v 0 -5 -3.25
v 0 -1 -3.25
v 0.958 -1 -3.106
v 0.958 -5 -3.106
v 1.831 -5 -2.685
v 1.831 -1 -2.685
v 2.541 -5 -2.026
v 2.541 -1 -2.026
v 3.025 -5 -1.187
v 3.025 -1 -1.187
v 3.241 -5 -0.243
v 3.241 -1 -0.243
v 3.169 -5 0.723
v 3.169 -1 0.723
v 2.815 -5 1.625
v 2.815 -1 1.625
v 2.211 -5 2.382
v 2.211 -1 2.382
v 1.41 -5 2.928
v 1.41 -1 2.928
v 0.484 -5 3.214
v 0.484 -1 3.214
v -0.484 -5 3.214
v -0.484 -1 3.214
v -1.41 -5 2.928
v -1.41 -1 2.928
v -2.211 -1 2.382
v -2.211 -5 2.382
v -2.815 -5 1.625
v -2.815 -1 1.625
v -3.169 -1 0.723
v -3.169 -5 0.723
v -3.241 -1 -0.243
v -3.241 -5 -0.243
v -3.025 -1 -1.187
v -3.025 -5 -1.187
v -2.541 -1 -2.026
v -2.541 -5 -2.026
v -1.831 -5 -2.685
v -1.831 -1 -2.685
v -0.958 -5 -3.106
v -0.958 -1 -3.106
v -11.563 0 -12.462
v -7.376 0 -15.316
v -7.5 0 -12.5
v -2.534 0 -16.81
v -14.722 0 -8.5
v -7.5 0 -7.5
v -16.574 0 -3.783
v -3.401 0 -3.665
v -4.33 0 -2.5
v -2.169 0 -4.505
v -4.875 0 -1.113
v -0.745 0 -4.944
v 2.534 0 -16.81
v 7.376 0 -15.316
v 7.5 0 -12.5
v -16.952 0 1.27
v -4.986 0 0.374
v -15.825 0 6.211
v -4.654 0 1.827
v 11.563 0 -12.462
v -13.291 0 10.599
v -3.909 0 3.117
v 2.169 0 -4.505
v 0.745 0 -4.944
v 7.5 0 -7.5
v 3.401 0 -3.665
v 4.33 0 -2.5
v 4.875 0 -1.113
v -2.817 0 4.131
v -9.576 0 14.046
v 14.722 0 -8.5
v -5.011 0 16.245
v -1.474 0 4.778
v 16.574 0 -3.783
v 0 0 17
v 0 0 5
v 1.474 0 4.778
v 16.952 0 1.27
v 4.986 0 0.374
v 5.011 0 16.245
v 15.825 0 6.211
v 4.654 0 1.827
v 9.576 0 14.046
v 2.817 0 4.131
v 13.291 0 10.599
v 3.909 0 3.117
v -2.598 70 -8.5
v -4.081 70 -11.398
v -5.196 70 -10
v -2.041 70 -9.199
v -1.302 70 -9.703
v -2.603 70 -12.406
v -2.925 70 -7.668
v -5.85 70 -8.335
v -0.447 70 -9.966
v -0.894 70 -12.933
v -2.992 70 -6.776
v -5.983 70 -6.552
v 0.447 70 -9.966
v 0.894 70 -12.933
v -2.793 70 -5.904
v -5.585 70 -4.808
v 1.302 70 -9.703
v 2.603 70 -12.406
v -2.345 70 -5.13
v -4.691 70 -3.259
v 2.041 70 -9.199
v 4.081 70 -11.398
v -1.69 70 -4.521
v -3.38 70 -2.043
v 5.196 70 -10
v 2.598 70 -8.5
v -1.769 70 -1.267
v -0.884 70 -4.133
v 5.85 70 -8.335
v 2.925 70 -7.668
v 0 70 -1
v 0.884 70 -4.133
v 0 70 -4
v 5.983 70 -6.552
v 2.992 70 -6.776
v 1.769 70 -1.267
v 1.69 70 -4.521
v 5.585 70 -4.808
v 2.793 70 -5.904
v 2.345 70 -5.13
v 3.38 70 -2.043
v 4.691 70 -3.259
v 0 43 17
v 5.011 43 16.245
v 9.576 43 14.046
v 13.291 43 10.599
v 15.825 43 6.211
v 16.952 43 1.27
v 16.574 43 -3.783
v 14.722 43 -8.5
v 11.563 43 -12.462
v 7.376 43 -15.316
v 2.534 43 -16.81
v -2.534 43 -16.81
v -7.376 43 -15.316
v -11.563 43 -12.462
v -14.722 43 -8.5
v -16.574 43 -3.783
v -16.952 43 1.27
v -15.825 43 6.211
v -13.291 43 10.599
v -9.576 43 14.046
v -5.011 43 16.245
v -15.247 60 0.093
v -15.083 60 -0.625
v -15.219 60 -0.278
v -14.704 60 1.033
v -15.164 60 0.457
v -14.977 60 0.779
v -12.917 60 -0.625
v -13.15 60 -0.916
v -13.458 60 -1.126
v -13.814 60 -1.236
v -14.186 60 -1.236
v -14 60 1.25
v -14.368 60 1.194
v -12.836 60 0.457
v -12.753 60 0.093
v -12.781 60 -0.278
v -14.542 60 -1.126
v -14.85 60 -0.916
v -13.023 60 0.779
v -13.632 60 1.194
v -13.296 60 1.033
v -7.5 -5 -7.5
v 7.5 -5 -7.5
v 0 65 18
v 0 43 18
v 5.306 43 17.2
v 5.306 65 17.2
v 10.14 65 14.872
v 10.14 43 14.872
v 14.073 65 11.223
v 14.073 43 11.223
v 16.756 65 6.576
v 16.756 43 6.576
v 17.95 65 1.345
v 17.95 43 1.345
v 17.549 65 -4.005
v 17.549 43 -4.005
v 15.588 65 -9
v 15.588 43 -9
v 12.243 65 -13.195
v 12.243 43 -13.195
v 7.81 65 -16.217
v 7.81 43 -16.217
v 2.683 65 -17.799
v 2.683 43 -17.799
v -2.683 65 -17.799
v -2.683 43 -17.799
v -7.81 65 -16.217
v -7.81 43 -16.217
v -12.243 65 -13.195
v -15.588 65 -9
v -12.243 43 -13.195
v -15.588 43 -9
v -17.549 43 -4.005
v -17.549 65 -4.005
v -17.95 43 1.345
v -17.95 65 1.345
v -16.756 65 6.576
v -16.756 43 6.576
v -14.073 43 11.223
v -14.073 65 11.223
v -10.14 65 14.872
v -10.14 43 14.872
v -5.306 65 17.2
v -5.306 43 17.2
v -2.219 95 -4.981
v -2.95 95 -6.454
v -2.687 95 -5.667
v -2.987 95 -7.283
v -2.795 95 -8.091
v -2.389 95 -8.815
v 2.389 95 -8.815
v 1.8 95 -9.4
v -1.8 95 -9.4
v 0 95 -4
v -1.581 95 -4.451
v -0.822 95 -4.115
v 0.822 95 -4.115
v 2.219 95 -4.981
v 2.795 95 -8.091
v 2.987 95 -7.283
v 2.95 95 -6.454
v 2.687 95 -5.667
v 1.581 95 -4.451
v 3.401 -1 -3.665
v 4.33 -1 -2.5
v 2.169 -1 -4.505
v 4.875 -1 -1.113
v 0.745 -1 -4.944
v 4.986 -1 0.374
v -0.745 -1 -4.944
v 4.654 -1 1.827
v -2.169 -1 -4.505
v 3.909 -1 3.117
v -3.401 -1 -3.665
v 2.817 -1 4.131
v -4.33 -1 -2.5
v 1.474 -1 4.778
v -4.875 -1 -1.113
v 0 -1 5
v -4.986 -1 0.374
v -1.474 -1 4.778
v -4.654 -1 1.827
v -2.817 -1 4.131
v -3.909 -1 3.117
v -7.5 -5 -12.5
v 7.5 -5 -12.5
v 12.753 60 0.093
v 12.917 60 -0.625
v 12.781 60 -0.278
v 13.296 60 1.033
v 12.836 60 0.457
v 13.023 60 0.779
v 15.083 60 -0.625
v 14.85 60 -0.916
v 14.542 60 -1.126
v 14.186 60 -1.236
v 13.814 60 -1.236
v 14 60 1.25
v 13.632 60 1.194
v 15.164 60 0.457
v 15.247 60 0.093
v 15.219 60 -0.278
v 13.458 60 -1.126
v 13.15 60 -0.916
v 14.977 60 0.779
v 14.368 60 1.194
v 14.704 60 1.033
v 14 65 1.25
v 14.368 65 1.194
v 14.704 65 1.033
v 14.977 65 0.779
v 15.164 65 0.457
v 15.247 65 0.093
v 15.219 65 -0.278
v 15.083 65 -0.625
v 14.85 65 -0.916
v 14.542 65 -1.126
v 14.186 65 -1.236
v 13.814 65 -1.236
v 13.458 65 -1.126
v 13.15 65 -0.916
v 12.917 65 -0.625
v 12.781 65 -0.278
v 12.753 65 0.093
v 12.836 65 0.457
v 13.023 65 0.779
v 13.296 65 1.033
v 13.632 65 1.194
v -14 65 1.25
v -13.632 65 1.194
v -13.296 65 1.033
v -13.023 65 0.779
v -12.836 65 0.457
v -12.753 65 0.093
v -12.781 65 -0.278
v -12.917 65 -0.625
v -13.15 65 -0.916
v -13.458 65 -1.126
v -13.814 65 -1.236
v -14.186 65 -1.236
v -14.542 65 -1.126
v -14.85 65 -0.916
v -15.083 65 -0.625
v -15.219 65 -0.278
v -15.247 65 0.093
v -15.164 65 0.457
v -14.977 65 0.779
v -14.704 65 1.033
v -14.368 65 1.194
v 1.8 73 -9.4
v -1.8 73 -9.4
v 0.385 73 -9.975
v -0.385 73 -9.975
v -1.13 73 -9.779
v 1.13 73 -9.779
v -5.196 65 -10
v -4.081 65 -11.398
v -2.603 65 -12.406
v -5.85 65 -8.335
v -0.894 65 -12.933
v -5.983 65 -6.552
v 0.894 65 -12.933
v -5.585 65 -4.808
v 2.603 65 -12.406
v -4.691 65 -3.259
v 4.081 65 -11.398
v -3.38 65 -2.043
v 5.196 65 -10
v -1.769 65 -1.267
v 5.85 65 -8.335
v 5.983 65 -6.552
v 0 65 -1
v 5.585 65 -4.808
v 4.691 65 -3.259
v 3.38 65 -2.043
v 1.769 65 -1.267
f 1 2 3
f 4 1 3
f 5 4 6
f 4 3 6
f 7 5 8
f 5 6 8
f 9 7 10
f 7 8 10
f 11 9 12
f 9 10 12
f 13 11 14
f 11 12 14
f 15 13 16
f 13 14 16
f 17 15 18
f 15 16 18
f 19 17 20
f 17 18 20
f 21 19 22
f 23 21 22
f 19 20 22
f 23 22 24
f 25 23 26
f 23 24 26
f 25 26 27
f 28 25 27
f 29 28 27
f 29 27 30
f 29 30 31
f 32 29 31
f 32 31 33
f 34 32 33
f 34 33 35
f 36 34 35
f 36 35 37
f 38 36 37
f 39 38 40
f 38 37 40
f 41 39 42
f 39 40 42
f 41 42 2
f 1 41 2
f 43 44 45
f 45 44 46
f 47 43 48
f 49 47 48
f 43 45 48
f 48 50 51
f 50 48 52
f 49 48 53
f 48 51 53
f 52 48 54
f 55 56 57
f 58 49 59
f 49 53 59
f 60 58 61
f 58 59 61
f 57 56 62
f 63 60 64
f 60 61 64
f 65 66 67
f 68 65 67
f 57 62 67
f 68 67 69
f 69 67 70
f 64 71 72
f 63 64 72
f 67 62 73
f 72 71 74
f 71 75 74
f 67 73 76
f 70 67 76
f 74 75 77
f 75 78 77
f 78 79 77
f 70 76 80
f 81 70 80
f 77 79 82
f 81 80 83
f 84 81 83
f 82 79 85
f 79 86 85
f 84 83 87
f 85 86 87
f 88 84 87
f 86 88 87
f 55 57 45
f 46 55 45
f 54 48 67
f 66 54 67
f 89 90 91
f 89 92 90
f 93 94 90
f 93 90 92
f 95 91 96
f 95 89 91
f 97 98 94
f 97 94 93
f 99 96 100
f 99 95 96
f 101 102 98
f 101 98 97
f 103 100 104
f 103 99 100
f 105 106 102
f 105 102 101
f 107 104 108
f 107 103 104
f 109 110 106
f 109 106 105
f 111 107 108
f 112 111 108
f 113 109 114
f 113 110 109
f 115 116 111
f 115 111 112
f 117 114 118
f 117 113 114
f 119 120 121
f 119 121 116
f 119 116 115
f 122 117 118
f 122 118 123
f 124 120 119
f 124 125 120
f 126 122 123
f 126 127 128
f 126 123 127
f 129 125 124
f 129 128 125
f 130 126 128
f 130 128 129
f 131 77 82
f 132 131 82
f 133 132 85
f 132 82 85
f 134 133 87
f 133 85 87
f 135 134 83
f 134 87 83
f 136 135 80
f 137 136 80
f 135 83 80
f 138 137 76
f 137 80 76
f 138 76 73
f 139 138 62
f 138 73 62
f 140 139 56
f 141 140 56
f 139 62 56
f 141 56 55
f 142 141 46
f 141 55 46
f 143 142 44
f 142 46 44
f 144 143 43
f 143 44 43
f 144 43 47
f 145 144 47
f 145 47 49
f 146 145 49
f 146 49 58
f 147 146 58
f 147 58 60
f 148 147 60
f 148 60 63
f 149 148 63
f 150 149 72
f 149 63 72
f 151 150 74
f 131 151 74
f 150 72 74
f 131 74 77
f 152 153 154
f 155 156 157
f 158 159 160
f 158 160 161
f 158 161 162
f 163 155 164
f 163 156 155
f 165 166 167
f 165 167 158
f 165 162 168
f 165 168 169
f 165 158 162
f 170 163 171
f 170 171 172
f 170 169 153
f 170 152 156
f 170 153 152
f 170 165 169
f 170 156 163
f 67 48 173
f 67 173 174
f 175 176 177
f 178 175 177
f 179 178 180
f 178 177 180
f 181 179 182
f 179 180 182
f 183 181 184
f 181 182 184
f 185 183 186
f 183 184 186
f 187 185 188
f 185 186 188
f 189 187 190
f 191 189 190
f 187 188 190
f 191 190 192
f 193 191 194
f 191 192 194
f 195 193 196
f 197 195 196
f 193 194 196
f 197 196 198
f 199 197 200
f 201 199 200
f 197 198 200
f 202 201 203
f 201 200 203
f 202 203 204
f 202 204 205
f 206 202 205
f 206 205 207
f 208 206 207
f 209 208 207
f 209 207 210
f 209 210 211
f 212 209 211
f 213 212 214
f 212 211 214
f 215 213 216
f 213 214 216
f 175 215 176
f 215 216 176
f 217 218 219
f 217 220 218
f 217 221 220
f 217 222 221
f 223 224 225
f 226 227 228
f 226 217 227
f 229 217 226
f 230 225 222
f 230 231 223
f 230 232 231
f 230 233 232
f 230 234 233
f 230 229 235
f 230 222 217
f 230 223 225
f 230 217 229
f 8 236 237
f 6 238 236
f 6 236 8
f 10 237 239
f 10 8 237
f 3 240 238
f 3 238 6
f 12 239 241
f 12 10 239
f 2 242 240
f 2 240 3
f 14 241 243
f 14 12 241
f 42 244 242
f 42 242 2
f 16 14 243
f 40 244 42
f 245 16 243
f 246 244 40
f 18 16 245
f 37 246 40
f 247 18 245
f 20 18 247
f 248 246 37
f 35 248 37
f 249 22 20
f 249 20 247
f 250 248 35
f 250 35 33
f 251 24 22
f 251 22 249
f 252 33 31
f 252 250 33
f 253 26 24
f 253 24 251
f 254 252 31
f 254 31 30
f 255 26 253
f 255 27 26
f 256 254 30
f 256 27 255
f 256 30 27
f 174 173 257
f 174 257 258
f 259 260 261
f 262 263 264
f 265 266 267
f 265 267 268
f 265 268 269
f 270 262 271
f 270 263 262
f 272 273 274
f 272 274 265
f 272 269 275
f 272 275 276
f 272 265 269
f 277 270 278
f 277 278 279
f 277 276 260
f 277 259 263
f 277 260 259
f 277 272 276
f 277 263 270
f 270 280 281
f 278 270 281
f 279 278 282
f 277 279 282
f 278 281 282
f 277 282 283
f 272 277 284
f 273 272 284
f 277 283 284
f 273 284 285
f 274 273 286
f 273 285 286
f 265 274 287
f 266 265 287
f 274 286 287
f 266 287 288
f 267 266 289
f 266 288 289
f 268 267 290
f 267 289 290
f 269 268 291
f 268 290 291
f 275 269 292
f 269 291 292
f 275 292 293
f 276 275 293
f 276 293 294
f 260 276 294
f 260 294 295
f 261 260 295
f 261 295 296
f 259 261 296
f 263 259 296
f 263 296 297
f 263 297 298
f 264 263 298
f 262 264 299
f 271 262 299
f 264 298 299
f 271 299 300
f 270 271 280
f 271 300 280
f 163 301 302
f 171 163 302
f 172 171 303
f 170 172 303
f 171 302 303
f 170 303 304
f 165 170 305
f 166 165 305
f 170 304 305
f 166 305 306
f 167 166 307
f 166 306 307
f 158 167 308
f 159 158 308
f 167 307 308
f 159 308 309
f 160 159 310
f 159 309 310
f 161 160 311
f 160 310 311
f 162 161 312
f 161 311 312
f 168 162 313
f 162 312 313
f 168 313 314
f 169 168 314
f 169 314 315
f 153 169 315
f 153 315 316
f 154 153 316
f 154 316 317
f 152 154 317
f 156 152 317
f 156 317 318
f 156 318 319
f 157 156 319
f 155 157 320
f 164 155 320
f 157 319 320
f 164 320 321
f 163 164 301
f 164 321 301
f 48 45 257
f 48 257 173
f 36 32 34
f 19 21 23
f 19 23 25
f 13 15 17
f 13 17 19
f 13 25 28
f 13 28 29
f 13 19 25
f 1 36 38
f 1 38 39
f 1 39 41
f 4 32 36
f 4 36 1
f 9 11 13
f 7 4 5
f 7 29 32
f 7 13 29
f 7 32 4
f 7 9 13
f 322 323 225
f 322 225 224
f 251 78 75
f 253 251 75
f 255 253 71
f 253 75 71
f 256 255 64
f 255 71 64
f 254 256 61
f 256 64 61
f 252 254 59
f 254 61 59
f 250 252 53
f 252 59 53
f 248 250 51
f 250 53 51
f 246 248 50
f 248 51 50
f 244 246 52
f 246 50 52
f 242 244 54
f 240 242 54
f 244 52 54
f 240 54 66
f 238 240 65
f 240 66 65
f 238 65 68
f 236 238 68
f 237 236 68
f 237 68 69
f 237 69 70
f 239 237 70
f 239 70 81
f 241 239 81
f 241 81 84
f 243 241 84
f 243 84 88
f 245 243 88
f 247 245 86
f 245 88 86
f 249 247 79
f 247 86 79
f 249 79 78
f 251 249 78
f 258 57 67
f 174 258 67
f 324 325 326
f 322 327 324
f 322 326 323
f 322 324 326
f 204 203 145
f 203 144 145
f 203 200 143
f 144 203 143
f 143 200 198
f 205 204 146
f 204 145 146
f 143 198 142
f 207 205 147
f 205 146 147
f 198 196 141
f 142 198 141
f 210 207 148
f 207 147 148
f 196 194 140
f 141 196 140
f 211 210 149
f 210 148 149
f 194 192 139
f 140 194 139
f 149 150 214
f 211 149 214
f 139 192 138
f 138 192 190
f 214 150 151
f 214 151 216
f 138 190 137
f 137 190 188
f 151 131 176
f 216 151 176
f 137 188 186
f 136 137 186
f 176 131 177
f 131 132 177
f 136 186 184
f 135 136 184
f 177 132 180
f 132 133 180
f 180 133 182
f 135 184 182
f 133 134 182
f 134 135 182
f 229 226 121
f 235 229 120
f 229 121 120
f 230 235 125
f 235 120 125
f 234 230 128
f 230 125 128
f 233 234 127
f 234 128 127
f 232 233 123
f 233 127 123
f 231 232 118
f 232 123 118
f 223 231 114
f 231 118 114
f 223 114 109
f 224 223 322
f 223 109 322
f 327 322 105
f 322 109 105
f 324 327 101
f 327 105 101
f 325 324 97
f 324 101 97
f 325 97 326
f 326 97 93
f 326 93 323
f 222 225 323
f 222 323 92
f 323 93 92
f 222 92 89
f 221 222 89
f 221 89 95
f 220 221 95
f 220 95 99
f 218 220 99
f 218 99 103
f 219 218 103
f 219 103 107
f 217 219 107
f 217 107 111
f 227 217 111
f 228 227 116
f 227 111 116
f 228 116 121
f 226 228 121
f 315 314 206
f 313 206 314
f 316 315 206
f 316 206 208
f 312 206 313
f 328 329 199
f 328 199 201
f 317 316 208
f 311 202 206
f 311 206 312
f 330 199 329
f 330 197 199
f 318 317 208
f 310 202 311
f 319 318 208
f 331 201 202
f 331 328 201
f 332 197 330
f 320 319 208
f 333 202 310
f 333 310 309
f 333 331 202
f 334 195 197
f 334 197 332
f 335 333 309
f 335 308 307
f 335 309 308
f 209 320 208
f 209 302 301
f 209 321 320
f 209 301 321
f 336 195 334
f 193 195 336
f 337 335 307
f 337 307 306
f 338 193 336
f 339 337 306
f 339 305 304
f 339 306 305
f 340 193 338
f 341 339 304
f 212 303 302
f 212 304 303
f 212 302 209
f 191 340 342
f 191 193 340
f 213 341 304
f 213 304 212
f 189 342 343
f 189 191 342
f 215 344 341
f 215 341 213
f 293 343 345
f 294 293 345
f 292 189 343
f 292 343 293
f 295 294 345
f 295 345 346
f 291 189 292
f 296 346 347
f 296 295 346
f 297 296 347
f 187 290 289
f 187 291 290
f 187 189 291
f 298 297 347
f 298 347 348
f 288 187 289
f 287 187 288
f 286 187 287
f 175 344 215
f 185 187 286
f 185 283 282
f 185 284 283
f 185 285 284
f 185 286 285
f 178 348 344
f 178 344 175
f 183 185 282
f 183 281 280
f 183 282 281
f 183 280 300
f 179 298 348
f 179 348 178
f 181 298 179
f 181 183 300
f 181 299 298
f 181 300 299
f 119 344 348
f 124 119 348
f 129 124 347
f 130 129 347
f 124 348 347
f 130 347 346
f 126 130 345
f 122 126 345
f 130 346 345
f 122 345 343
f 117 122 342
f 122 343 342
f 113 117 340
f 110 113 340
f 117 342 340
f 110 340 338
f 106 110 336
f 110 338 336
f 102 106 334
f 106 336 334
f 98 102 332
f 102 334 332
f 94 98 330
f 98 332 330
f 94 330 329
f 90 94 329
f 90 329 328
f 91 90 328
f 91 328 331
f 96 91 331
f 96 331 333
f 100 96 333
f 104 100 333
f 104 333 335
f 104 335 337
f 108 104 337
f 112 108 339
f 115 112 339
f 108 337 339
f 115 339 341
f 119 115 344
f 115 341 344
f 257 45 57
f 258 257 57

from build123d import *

# Parameters (mm, degrees)
ESQUISSE1_R                  = 17
BOSS_EXTRU_1_DEPTH           = 43
ESQUISSE2_R                  = 18
BOSS_EXTRU_2_DEPTH           = 22
ESQUISSE3_R                  = 6
BOSS_EXTRU_3_DEPTH           = 5
ESQUISSE4_R                  = 3
BOSS_EXTRU_4_DEPTH           = 25
ESQUISSE5_R                  = 1.25
ENL_V_MAT_EXTRU_1_DEPTH      = 5
ESQUISSE6_W                  = 15
ESQUISSE6_H                  = 5
BOSS_EXTRU_5_DEPTH           = 5
ENL_V_MAT_EXTRU_4_DEPTH      = 10
ENL_V_MAT_EXTRU_4_DEPTH_BACK = 22
ESQUISSE8_R                  = 5
BOSS_EXTRU_6_DEPTH           = 1
ESQUISSE9_R                  = 3.25
BOSS_EXTRU_7_DEPTH           = 4


with BuildPart() as part:
    # Esquisse1 → Boss.-Extru.1 (new body)
    with BuildSketch(Plane(origin=(0, 0, 0), x_dir=(1, 0, 0), z_dir=(0, 1, 0))):
        with Locations(Location((0, 0, 0), (0, 0, 270))):
            Circle(ESQUISSE1_R)
    extrude(amount=BOSS_EXTRU_1_DEPTH)

    # Esquisse2 → Boss.-Extru.2 (add)
    with BuildSketch(Plane(origin=(0, 43, 0), x_dir=(1, 0, 0), z_dir=(0, 1, 0))):
        with Locations(Location((0, 0, 0), (0, 0, 270))):
            Circle(ESQUISSE2_R)
    extrude(amount=BOSS_EXTRU_2_DEPTH)

    # Esquisse3 → Boss.-Extru.3 (add)
    with BuildSketch(Plane(origin=(0, 65, 0), x_dir=(1, 0, 0), z_dir=(0, 1, 0))):
        with Locations(Location((0, 7, 0), (0, 0, 270))):
            Circle(ESQUISSE3_R)
    extrude(amount=BOSS_EXTRU_3_DEPTH)

    # Esquisse4 → Boss.-Extru.4 (add)
    with BuildSketch(Plane(origin=(0, 70, 0), x_dir=(1, 0, 0), z_dir=(0, 1, 0))):
        with Locations(Location((0, 7, 0), (0, 0, 270))):
            Circle(ESQUISSE4_R)
    extrude(amount=BOSS_EXTRU_4_DEPTH)

    # Esquisse5 → Enlèv. mat.-Extru.1 (cut)
    with BuildSketch(Plane(origin=(0, 65, 0), x_dir=(1, 0, 0), z_dir=(0, 1, 0))):
        with Locations(Location((14, 0, 0), (0, 0, 270))):
            Circle(ESQUISSE5_R)
        with Locations(Location((-14, 0, 0), (0, 0, 270))):
            Circle(ESQUISSE5_R)
    extrude(amount=-ENL_V_MAT_EXTRU_1_DEPTH, mode=Mode.SUBTRACT)

    # Esquisse6 → Boss.-Extru.5 (add)
    with BuildSketch(Plane.XZ):
        with Locations((0, -10)):
            Rectangle(ESQUISSE6_W, ESQUISSE6_H)
    extrude(amount=BOSS_EXTRU_5_DEPTH)

    # Esquisse7 → Enlèv. mat.-Extru.4 (cut, two sides)
    with BuildSketch(Plane(origin=(0, 95, 0), x_dir=(1, 0, 0), z_dir=(0, 1, 0))) as enl_v_mat_extru_4_sk:
        with BuildLine():
            Line((-1.8, 9.4), (1.8, 9.4))
            ThreePointArc((1.8, 9.4), (0, 10), (-1.8, 9.4))
        make_face()
    extrude(amount=ENL_V_MAT_EXTRU_4_DEPTH, mode=Mode.SUBTRACT)
    extrude(enl_v_mat_extru_4_sk.sketch, amount=-ENL_V_MAT_EXTRU_4_DEPTH_BACK, mode=Mode.SUBTRACT)

    # Esquisse8 → Boss.-Extru.6 (add)
    with BuildSketch(Plane.XZ):
        with Locations(Location((0, 0, 0), (0, 0, 90))):
            Circle(ESQUISSE8_R)
    extrude(amount=BOSS_EXTRU_6_DEPTH)

    # Esquisse9 → Boss.-Extru.7 (add)
    with BuildSketch(Plane.XZ.offset(1)):
        with Locations(Location((0, 0, 0), (0, 0, 270))):
            Circle(ESQUISSE9_R)
    extrude(amount=BOSS_EXTRU_7_DEPTH)


solid = part.part
